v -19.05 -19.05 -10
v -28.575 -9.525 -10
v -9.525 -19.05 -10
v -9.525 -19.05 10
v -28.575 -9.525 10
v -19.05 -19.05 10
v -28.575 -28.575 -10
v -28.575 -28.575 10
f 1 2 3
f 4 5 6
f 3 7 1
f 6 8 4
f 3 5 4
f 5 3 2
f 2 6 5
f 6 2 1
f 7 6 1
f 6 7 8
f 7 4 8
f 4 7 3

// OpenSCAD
polyhedron(
    points=[
    [-9.525, -19.05, -10],
    [-28.575, -9.525, -10],
    [-19.05, -19.05, -10],
    [-28.575, -28.575, -10],
    [-9.525, -19.05, 10],
    [-28.575, -9.525, 10],
    [-19.05, -19.05, 10],
    [-28.575, -28.575, 10],
    ],
    faces=[
        [0,1,2],
        [6,5,4],
        [2,3,0],
        [4,7,6],
        [0,4,5,1],
        [1,5,6,2],
        [2,6,7,3],
        [3,7,4,0],
    ]
);
